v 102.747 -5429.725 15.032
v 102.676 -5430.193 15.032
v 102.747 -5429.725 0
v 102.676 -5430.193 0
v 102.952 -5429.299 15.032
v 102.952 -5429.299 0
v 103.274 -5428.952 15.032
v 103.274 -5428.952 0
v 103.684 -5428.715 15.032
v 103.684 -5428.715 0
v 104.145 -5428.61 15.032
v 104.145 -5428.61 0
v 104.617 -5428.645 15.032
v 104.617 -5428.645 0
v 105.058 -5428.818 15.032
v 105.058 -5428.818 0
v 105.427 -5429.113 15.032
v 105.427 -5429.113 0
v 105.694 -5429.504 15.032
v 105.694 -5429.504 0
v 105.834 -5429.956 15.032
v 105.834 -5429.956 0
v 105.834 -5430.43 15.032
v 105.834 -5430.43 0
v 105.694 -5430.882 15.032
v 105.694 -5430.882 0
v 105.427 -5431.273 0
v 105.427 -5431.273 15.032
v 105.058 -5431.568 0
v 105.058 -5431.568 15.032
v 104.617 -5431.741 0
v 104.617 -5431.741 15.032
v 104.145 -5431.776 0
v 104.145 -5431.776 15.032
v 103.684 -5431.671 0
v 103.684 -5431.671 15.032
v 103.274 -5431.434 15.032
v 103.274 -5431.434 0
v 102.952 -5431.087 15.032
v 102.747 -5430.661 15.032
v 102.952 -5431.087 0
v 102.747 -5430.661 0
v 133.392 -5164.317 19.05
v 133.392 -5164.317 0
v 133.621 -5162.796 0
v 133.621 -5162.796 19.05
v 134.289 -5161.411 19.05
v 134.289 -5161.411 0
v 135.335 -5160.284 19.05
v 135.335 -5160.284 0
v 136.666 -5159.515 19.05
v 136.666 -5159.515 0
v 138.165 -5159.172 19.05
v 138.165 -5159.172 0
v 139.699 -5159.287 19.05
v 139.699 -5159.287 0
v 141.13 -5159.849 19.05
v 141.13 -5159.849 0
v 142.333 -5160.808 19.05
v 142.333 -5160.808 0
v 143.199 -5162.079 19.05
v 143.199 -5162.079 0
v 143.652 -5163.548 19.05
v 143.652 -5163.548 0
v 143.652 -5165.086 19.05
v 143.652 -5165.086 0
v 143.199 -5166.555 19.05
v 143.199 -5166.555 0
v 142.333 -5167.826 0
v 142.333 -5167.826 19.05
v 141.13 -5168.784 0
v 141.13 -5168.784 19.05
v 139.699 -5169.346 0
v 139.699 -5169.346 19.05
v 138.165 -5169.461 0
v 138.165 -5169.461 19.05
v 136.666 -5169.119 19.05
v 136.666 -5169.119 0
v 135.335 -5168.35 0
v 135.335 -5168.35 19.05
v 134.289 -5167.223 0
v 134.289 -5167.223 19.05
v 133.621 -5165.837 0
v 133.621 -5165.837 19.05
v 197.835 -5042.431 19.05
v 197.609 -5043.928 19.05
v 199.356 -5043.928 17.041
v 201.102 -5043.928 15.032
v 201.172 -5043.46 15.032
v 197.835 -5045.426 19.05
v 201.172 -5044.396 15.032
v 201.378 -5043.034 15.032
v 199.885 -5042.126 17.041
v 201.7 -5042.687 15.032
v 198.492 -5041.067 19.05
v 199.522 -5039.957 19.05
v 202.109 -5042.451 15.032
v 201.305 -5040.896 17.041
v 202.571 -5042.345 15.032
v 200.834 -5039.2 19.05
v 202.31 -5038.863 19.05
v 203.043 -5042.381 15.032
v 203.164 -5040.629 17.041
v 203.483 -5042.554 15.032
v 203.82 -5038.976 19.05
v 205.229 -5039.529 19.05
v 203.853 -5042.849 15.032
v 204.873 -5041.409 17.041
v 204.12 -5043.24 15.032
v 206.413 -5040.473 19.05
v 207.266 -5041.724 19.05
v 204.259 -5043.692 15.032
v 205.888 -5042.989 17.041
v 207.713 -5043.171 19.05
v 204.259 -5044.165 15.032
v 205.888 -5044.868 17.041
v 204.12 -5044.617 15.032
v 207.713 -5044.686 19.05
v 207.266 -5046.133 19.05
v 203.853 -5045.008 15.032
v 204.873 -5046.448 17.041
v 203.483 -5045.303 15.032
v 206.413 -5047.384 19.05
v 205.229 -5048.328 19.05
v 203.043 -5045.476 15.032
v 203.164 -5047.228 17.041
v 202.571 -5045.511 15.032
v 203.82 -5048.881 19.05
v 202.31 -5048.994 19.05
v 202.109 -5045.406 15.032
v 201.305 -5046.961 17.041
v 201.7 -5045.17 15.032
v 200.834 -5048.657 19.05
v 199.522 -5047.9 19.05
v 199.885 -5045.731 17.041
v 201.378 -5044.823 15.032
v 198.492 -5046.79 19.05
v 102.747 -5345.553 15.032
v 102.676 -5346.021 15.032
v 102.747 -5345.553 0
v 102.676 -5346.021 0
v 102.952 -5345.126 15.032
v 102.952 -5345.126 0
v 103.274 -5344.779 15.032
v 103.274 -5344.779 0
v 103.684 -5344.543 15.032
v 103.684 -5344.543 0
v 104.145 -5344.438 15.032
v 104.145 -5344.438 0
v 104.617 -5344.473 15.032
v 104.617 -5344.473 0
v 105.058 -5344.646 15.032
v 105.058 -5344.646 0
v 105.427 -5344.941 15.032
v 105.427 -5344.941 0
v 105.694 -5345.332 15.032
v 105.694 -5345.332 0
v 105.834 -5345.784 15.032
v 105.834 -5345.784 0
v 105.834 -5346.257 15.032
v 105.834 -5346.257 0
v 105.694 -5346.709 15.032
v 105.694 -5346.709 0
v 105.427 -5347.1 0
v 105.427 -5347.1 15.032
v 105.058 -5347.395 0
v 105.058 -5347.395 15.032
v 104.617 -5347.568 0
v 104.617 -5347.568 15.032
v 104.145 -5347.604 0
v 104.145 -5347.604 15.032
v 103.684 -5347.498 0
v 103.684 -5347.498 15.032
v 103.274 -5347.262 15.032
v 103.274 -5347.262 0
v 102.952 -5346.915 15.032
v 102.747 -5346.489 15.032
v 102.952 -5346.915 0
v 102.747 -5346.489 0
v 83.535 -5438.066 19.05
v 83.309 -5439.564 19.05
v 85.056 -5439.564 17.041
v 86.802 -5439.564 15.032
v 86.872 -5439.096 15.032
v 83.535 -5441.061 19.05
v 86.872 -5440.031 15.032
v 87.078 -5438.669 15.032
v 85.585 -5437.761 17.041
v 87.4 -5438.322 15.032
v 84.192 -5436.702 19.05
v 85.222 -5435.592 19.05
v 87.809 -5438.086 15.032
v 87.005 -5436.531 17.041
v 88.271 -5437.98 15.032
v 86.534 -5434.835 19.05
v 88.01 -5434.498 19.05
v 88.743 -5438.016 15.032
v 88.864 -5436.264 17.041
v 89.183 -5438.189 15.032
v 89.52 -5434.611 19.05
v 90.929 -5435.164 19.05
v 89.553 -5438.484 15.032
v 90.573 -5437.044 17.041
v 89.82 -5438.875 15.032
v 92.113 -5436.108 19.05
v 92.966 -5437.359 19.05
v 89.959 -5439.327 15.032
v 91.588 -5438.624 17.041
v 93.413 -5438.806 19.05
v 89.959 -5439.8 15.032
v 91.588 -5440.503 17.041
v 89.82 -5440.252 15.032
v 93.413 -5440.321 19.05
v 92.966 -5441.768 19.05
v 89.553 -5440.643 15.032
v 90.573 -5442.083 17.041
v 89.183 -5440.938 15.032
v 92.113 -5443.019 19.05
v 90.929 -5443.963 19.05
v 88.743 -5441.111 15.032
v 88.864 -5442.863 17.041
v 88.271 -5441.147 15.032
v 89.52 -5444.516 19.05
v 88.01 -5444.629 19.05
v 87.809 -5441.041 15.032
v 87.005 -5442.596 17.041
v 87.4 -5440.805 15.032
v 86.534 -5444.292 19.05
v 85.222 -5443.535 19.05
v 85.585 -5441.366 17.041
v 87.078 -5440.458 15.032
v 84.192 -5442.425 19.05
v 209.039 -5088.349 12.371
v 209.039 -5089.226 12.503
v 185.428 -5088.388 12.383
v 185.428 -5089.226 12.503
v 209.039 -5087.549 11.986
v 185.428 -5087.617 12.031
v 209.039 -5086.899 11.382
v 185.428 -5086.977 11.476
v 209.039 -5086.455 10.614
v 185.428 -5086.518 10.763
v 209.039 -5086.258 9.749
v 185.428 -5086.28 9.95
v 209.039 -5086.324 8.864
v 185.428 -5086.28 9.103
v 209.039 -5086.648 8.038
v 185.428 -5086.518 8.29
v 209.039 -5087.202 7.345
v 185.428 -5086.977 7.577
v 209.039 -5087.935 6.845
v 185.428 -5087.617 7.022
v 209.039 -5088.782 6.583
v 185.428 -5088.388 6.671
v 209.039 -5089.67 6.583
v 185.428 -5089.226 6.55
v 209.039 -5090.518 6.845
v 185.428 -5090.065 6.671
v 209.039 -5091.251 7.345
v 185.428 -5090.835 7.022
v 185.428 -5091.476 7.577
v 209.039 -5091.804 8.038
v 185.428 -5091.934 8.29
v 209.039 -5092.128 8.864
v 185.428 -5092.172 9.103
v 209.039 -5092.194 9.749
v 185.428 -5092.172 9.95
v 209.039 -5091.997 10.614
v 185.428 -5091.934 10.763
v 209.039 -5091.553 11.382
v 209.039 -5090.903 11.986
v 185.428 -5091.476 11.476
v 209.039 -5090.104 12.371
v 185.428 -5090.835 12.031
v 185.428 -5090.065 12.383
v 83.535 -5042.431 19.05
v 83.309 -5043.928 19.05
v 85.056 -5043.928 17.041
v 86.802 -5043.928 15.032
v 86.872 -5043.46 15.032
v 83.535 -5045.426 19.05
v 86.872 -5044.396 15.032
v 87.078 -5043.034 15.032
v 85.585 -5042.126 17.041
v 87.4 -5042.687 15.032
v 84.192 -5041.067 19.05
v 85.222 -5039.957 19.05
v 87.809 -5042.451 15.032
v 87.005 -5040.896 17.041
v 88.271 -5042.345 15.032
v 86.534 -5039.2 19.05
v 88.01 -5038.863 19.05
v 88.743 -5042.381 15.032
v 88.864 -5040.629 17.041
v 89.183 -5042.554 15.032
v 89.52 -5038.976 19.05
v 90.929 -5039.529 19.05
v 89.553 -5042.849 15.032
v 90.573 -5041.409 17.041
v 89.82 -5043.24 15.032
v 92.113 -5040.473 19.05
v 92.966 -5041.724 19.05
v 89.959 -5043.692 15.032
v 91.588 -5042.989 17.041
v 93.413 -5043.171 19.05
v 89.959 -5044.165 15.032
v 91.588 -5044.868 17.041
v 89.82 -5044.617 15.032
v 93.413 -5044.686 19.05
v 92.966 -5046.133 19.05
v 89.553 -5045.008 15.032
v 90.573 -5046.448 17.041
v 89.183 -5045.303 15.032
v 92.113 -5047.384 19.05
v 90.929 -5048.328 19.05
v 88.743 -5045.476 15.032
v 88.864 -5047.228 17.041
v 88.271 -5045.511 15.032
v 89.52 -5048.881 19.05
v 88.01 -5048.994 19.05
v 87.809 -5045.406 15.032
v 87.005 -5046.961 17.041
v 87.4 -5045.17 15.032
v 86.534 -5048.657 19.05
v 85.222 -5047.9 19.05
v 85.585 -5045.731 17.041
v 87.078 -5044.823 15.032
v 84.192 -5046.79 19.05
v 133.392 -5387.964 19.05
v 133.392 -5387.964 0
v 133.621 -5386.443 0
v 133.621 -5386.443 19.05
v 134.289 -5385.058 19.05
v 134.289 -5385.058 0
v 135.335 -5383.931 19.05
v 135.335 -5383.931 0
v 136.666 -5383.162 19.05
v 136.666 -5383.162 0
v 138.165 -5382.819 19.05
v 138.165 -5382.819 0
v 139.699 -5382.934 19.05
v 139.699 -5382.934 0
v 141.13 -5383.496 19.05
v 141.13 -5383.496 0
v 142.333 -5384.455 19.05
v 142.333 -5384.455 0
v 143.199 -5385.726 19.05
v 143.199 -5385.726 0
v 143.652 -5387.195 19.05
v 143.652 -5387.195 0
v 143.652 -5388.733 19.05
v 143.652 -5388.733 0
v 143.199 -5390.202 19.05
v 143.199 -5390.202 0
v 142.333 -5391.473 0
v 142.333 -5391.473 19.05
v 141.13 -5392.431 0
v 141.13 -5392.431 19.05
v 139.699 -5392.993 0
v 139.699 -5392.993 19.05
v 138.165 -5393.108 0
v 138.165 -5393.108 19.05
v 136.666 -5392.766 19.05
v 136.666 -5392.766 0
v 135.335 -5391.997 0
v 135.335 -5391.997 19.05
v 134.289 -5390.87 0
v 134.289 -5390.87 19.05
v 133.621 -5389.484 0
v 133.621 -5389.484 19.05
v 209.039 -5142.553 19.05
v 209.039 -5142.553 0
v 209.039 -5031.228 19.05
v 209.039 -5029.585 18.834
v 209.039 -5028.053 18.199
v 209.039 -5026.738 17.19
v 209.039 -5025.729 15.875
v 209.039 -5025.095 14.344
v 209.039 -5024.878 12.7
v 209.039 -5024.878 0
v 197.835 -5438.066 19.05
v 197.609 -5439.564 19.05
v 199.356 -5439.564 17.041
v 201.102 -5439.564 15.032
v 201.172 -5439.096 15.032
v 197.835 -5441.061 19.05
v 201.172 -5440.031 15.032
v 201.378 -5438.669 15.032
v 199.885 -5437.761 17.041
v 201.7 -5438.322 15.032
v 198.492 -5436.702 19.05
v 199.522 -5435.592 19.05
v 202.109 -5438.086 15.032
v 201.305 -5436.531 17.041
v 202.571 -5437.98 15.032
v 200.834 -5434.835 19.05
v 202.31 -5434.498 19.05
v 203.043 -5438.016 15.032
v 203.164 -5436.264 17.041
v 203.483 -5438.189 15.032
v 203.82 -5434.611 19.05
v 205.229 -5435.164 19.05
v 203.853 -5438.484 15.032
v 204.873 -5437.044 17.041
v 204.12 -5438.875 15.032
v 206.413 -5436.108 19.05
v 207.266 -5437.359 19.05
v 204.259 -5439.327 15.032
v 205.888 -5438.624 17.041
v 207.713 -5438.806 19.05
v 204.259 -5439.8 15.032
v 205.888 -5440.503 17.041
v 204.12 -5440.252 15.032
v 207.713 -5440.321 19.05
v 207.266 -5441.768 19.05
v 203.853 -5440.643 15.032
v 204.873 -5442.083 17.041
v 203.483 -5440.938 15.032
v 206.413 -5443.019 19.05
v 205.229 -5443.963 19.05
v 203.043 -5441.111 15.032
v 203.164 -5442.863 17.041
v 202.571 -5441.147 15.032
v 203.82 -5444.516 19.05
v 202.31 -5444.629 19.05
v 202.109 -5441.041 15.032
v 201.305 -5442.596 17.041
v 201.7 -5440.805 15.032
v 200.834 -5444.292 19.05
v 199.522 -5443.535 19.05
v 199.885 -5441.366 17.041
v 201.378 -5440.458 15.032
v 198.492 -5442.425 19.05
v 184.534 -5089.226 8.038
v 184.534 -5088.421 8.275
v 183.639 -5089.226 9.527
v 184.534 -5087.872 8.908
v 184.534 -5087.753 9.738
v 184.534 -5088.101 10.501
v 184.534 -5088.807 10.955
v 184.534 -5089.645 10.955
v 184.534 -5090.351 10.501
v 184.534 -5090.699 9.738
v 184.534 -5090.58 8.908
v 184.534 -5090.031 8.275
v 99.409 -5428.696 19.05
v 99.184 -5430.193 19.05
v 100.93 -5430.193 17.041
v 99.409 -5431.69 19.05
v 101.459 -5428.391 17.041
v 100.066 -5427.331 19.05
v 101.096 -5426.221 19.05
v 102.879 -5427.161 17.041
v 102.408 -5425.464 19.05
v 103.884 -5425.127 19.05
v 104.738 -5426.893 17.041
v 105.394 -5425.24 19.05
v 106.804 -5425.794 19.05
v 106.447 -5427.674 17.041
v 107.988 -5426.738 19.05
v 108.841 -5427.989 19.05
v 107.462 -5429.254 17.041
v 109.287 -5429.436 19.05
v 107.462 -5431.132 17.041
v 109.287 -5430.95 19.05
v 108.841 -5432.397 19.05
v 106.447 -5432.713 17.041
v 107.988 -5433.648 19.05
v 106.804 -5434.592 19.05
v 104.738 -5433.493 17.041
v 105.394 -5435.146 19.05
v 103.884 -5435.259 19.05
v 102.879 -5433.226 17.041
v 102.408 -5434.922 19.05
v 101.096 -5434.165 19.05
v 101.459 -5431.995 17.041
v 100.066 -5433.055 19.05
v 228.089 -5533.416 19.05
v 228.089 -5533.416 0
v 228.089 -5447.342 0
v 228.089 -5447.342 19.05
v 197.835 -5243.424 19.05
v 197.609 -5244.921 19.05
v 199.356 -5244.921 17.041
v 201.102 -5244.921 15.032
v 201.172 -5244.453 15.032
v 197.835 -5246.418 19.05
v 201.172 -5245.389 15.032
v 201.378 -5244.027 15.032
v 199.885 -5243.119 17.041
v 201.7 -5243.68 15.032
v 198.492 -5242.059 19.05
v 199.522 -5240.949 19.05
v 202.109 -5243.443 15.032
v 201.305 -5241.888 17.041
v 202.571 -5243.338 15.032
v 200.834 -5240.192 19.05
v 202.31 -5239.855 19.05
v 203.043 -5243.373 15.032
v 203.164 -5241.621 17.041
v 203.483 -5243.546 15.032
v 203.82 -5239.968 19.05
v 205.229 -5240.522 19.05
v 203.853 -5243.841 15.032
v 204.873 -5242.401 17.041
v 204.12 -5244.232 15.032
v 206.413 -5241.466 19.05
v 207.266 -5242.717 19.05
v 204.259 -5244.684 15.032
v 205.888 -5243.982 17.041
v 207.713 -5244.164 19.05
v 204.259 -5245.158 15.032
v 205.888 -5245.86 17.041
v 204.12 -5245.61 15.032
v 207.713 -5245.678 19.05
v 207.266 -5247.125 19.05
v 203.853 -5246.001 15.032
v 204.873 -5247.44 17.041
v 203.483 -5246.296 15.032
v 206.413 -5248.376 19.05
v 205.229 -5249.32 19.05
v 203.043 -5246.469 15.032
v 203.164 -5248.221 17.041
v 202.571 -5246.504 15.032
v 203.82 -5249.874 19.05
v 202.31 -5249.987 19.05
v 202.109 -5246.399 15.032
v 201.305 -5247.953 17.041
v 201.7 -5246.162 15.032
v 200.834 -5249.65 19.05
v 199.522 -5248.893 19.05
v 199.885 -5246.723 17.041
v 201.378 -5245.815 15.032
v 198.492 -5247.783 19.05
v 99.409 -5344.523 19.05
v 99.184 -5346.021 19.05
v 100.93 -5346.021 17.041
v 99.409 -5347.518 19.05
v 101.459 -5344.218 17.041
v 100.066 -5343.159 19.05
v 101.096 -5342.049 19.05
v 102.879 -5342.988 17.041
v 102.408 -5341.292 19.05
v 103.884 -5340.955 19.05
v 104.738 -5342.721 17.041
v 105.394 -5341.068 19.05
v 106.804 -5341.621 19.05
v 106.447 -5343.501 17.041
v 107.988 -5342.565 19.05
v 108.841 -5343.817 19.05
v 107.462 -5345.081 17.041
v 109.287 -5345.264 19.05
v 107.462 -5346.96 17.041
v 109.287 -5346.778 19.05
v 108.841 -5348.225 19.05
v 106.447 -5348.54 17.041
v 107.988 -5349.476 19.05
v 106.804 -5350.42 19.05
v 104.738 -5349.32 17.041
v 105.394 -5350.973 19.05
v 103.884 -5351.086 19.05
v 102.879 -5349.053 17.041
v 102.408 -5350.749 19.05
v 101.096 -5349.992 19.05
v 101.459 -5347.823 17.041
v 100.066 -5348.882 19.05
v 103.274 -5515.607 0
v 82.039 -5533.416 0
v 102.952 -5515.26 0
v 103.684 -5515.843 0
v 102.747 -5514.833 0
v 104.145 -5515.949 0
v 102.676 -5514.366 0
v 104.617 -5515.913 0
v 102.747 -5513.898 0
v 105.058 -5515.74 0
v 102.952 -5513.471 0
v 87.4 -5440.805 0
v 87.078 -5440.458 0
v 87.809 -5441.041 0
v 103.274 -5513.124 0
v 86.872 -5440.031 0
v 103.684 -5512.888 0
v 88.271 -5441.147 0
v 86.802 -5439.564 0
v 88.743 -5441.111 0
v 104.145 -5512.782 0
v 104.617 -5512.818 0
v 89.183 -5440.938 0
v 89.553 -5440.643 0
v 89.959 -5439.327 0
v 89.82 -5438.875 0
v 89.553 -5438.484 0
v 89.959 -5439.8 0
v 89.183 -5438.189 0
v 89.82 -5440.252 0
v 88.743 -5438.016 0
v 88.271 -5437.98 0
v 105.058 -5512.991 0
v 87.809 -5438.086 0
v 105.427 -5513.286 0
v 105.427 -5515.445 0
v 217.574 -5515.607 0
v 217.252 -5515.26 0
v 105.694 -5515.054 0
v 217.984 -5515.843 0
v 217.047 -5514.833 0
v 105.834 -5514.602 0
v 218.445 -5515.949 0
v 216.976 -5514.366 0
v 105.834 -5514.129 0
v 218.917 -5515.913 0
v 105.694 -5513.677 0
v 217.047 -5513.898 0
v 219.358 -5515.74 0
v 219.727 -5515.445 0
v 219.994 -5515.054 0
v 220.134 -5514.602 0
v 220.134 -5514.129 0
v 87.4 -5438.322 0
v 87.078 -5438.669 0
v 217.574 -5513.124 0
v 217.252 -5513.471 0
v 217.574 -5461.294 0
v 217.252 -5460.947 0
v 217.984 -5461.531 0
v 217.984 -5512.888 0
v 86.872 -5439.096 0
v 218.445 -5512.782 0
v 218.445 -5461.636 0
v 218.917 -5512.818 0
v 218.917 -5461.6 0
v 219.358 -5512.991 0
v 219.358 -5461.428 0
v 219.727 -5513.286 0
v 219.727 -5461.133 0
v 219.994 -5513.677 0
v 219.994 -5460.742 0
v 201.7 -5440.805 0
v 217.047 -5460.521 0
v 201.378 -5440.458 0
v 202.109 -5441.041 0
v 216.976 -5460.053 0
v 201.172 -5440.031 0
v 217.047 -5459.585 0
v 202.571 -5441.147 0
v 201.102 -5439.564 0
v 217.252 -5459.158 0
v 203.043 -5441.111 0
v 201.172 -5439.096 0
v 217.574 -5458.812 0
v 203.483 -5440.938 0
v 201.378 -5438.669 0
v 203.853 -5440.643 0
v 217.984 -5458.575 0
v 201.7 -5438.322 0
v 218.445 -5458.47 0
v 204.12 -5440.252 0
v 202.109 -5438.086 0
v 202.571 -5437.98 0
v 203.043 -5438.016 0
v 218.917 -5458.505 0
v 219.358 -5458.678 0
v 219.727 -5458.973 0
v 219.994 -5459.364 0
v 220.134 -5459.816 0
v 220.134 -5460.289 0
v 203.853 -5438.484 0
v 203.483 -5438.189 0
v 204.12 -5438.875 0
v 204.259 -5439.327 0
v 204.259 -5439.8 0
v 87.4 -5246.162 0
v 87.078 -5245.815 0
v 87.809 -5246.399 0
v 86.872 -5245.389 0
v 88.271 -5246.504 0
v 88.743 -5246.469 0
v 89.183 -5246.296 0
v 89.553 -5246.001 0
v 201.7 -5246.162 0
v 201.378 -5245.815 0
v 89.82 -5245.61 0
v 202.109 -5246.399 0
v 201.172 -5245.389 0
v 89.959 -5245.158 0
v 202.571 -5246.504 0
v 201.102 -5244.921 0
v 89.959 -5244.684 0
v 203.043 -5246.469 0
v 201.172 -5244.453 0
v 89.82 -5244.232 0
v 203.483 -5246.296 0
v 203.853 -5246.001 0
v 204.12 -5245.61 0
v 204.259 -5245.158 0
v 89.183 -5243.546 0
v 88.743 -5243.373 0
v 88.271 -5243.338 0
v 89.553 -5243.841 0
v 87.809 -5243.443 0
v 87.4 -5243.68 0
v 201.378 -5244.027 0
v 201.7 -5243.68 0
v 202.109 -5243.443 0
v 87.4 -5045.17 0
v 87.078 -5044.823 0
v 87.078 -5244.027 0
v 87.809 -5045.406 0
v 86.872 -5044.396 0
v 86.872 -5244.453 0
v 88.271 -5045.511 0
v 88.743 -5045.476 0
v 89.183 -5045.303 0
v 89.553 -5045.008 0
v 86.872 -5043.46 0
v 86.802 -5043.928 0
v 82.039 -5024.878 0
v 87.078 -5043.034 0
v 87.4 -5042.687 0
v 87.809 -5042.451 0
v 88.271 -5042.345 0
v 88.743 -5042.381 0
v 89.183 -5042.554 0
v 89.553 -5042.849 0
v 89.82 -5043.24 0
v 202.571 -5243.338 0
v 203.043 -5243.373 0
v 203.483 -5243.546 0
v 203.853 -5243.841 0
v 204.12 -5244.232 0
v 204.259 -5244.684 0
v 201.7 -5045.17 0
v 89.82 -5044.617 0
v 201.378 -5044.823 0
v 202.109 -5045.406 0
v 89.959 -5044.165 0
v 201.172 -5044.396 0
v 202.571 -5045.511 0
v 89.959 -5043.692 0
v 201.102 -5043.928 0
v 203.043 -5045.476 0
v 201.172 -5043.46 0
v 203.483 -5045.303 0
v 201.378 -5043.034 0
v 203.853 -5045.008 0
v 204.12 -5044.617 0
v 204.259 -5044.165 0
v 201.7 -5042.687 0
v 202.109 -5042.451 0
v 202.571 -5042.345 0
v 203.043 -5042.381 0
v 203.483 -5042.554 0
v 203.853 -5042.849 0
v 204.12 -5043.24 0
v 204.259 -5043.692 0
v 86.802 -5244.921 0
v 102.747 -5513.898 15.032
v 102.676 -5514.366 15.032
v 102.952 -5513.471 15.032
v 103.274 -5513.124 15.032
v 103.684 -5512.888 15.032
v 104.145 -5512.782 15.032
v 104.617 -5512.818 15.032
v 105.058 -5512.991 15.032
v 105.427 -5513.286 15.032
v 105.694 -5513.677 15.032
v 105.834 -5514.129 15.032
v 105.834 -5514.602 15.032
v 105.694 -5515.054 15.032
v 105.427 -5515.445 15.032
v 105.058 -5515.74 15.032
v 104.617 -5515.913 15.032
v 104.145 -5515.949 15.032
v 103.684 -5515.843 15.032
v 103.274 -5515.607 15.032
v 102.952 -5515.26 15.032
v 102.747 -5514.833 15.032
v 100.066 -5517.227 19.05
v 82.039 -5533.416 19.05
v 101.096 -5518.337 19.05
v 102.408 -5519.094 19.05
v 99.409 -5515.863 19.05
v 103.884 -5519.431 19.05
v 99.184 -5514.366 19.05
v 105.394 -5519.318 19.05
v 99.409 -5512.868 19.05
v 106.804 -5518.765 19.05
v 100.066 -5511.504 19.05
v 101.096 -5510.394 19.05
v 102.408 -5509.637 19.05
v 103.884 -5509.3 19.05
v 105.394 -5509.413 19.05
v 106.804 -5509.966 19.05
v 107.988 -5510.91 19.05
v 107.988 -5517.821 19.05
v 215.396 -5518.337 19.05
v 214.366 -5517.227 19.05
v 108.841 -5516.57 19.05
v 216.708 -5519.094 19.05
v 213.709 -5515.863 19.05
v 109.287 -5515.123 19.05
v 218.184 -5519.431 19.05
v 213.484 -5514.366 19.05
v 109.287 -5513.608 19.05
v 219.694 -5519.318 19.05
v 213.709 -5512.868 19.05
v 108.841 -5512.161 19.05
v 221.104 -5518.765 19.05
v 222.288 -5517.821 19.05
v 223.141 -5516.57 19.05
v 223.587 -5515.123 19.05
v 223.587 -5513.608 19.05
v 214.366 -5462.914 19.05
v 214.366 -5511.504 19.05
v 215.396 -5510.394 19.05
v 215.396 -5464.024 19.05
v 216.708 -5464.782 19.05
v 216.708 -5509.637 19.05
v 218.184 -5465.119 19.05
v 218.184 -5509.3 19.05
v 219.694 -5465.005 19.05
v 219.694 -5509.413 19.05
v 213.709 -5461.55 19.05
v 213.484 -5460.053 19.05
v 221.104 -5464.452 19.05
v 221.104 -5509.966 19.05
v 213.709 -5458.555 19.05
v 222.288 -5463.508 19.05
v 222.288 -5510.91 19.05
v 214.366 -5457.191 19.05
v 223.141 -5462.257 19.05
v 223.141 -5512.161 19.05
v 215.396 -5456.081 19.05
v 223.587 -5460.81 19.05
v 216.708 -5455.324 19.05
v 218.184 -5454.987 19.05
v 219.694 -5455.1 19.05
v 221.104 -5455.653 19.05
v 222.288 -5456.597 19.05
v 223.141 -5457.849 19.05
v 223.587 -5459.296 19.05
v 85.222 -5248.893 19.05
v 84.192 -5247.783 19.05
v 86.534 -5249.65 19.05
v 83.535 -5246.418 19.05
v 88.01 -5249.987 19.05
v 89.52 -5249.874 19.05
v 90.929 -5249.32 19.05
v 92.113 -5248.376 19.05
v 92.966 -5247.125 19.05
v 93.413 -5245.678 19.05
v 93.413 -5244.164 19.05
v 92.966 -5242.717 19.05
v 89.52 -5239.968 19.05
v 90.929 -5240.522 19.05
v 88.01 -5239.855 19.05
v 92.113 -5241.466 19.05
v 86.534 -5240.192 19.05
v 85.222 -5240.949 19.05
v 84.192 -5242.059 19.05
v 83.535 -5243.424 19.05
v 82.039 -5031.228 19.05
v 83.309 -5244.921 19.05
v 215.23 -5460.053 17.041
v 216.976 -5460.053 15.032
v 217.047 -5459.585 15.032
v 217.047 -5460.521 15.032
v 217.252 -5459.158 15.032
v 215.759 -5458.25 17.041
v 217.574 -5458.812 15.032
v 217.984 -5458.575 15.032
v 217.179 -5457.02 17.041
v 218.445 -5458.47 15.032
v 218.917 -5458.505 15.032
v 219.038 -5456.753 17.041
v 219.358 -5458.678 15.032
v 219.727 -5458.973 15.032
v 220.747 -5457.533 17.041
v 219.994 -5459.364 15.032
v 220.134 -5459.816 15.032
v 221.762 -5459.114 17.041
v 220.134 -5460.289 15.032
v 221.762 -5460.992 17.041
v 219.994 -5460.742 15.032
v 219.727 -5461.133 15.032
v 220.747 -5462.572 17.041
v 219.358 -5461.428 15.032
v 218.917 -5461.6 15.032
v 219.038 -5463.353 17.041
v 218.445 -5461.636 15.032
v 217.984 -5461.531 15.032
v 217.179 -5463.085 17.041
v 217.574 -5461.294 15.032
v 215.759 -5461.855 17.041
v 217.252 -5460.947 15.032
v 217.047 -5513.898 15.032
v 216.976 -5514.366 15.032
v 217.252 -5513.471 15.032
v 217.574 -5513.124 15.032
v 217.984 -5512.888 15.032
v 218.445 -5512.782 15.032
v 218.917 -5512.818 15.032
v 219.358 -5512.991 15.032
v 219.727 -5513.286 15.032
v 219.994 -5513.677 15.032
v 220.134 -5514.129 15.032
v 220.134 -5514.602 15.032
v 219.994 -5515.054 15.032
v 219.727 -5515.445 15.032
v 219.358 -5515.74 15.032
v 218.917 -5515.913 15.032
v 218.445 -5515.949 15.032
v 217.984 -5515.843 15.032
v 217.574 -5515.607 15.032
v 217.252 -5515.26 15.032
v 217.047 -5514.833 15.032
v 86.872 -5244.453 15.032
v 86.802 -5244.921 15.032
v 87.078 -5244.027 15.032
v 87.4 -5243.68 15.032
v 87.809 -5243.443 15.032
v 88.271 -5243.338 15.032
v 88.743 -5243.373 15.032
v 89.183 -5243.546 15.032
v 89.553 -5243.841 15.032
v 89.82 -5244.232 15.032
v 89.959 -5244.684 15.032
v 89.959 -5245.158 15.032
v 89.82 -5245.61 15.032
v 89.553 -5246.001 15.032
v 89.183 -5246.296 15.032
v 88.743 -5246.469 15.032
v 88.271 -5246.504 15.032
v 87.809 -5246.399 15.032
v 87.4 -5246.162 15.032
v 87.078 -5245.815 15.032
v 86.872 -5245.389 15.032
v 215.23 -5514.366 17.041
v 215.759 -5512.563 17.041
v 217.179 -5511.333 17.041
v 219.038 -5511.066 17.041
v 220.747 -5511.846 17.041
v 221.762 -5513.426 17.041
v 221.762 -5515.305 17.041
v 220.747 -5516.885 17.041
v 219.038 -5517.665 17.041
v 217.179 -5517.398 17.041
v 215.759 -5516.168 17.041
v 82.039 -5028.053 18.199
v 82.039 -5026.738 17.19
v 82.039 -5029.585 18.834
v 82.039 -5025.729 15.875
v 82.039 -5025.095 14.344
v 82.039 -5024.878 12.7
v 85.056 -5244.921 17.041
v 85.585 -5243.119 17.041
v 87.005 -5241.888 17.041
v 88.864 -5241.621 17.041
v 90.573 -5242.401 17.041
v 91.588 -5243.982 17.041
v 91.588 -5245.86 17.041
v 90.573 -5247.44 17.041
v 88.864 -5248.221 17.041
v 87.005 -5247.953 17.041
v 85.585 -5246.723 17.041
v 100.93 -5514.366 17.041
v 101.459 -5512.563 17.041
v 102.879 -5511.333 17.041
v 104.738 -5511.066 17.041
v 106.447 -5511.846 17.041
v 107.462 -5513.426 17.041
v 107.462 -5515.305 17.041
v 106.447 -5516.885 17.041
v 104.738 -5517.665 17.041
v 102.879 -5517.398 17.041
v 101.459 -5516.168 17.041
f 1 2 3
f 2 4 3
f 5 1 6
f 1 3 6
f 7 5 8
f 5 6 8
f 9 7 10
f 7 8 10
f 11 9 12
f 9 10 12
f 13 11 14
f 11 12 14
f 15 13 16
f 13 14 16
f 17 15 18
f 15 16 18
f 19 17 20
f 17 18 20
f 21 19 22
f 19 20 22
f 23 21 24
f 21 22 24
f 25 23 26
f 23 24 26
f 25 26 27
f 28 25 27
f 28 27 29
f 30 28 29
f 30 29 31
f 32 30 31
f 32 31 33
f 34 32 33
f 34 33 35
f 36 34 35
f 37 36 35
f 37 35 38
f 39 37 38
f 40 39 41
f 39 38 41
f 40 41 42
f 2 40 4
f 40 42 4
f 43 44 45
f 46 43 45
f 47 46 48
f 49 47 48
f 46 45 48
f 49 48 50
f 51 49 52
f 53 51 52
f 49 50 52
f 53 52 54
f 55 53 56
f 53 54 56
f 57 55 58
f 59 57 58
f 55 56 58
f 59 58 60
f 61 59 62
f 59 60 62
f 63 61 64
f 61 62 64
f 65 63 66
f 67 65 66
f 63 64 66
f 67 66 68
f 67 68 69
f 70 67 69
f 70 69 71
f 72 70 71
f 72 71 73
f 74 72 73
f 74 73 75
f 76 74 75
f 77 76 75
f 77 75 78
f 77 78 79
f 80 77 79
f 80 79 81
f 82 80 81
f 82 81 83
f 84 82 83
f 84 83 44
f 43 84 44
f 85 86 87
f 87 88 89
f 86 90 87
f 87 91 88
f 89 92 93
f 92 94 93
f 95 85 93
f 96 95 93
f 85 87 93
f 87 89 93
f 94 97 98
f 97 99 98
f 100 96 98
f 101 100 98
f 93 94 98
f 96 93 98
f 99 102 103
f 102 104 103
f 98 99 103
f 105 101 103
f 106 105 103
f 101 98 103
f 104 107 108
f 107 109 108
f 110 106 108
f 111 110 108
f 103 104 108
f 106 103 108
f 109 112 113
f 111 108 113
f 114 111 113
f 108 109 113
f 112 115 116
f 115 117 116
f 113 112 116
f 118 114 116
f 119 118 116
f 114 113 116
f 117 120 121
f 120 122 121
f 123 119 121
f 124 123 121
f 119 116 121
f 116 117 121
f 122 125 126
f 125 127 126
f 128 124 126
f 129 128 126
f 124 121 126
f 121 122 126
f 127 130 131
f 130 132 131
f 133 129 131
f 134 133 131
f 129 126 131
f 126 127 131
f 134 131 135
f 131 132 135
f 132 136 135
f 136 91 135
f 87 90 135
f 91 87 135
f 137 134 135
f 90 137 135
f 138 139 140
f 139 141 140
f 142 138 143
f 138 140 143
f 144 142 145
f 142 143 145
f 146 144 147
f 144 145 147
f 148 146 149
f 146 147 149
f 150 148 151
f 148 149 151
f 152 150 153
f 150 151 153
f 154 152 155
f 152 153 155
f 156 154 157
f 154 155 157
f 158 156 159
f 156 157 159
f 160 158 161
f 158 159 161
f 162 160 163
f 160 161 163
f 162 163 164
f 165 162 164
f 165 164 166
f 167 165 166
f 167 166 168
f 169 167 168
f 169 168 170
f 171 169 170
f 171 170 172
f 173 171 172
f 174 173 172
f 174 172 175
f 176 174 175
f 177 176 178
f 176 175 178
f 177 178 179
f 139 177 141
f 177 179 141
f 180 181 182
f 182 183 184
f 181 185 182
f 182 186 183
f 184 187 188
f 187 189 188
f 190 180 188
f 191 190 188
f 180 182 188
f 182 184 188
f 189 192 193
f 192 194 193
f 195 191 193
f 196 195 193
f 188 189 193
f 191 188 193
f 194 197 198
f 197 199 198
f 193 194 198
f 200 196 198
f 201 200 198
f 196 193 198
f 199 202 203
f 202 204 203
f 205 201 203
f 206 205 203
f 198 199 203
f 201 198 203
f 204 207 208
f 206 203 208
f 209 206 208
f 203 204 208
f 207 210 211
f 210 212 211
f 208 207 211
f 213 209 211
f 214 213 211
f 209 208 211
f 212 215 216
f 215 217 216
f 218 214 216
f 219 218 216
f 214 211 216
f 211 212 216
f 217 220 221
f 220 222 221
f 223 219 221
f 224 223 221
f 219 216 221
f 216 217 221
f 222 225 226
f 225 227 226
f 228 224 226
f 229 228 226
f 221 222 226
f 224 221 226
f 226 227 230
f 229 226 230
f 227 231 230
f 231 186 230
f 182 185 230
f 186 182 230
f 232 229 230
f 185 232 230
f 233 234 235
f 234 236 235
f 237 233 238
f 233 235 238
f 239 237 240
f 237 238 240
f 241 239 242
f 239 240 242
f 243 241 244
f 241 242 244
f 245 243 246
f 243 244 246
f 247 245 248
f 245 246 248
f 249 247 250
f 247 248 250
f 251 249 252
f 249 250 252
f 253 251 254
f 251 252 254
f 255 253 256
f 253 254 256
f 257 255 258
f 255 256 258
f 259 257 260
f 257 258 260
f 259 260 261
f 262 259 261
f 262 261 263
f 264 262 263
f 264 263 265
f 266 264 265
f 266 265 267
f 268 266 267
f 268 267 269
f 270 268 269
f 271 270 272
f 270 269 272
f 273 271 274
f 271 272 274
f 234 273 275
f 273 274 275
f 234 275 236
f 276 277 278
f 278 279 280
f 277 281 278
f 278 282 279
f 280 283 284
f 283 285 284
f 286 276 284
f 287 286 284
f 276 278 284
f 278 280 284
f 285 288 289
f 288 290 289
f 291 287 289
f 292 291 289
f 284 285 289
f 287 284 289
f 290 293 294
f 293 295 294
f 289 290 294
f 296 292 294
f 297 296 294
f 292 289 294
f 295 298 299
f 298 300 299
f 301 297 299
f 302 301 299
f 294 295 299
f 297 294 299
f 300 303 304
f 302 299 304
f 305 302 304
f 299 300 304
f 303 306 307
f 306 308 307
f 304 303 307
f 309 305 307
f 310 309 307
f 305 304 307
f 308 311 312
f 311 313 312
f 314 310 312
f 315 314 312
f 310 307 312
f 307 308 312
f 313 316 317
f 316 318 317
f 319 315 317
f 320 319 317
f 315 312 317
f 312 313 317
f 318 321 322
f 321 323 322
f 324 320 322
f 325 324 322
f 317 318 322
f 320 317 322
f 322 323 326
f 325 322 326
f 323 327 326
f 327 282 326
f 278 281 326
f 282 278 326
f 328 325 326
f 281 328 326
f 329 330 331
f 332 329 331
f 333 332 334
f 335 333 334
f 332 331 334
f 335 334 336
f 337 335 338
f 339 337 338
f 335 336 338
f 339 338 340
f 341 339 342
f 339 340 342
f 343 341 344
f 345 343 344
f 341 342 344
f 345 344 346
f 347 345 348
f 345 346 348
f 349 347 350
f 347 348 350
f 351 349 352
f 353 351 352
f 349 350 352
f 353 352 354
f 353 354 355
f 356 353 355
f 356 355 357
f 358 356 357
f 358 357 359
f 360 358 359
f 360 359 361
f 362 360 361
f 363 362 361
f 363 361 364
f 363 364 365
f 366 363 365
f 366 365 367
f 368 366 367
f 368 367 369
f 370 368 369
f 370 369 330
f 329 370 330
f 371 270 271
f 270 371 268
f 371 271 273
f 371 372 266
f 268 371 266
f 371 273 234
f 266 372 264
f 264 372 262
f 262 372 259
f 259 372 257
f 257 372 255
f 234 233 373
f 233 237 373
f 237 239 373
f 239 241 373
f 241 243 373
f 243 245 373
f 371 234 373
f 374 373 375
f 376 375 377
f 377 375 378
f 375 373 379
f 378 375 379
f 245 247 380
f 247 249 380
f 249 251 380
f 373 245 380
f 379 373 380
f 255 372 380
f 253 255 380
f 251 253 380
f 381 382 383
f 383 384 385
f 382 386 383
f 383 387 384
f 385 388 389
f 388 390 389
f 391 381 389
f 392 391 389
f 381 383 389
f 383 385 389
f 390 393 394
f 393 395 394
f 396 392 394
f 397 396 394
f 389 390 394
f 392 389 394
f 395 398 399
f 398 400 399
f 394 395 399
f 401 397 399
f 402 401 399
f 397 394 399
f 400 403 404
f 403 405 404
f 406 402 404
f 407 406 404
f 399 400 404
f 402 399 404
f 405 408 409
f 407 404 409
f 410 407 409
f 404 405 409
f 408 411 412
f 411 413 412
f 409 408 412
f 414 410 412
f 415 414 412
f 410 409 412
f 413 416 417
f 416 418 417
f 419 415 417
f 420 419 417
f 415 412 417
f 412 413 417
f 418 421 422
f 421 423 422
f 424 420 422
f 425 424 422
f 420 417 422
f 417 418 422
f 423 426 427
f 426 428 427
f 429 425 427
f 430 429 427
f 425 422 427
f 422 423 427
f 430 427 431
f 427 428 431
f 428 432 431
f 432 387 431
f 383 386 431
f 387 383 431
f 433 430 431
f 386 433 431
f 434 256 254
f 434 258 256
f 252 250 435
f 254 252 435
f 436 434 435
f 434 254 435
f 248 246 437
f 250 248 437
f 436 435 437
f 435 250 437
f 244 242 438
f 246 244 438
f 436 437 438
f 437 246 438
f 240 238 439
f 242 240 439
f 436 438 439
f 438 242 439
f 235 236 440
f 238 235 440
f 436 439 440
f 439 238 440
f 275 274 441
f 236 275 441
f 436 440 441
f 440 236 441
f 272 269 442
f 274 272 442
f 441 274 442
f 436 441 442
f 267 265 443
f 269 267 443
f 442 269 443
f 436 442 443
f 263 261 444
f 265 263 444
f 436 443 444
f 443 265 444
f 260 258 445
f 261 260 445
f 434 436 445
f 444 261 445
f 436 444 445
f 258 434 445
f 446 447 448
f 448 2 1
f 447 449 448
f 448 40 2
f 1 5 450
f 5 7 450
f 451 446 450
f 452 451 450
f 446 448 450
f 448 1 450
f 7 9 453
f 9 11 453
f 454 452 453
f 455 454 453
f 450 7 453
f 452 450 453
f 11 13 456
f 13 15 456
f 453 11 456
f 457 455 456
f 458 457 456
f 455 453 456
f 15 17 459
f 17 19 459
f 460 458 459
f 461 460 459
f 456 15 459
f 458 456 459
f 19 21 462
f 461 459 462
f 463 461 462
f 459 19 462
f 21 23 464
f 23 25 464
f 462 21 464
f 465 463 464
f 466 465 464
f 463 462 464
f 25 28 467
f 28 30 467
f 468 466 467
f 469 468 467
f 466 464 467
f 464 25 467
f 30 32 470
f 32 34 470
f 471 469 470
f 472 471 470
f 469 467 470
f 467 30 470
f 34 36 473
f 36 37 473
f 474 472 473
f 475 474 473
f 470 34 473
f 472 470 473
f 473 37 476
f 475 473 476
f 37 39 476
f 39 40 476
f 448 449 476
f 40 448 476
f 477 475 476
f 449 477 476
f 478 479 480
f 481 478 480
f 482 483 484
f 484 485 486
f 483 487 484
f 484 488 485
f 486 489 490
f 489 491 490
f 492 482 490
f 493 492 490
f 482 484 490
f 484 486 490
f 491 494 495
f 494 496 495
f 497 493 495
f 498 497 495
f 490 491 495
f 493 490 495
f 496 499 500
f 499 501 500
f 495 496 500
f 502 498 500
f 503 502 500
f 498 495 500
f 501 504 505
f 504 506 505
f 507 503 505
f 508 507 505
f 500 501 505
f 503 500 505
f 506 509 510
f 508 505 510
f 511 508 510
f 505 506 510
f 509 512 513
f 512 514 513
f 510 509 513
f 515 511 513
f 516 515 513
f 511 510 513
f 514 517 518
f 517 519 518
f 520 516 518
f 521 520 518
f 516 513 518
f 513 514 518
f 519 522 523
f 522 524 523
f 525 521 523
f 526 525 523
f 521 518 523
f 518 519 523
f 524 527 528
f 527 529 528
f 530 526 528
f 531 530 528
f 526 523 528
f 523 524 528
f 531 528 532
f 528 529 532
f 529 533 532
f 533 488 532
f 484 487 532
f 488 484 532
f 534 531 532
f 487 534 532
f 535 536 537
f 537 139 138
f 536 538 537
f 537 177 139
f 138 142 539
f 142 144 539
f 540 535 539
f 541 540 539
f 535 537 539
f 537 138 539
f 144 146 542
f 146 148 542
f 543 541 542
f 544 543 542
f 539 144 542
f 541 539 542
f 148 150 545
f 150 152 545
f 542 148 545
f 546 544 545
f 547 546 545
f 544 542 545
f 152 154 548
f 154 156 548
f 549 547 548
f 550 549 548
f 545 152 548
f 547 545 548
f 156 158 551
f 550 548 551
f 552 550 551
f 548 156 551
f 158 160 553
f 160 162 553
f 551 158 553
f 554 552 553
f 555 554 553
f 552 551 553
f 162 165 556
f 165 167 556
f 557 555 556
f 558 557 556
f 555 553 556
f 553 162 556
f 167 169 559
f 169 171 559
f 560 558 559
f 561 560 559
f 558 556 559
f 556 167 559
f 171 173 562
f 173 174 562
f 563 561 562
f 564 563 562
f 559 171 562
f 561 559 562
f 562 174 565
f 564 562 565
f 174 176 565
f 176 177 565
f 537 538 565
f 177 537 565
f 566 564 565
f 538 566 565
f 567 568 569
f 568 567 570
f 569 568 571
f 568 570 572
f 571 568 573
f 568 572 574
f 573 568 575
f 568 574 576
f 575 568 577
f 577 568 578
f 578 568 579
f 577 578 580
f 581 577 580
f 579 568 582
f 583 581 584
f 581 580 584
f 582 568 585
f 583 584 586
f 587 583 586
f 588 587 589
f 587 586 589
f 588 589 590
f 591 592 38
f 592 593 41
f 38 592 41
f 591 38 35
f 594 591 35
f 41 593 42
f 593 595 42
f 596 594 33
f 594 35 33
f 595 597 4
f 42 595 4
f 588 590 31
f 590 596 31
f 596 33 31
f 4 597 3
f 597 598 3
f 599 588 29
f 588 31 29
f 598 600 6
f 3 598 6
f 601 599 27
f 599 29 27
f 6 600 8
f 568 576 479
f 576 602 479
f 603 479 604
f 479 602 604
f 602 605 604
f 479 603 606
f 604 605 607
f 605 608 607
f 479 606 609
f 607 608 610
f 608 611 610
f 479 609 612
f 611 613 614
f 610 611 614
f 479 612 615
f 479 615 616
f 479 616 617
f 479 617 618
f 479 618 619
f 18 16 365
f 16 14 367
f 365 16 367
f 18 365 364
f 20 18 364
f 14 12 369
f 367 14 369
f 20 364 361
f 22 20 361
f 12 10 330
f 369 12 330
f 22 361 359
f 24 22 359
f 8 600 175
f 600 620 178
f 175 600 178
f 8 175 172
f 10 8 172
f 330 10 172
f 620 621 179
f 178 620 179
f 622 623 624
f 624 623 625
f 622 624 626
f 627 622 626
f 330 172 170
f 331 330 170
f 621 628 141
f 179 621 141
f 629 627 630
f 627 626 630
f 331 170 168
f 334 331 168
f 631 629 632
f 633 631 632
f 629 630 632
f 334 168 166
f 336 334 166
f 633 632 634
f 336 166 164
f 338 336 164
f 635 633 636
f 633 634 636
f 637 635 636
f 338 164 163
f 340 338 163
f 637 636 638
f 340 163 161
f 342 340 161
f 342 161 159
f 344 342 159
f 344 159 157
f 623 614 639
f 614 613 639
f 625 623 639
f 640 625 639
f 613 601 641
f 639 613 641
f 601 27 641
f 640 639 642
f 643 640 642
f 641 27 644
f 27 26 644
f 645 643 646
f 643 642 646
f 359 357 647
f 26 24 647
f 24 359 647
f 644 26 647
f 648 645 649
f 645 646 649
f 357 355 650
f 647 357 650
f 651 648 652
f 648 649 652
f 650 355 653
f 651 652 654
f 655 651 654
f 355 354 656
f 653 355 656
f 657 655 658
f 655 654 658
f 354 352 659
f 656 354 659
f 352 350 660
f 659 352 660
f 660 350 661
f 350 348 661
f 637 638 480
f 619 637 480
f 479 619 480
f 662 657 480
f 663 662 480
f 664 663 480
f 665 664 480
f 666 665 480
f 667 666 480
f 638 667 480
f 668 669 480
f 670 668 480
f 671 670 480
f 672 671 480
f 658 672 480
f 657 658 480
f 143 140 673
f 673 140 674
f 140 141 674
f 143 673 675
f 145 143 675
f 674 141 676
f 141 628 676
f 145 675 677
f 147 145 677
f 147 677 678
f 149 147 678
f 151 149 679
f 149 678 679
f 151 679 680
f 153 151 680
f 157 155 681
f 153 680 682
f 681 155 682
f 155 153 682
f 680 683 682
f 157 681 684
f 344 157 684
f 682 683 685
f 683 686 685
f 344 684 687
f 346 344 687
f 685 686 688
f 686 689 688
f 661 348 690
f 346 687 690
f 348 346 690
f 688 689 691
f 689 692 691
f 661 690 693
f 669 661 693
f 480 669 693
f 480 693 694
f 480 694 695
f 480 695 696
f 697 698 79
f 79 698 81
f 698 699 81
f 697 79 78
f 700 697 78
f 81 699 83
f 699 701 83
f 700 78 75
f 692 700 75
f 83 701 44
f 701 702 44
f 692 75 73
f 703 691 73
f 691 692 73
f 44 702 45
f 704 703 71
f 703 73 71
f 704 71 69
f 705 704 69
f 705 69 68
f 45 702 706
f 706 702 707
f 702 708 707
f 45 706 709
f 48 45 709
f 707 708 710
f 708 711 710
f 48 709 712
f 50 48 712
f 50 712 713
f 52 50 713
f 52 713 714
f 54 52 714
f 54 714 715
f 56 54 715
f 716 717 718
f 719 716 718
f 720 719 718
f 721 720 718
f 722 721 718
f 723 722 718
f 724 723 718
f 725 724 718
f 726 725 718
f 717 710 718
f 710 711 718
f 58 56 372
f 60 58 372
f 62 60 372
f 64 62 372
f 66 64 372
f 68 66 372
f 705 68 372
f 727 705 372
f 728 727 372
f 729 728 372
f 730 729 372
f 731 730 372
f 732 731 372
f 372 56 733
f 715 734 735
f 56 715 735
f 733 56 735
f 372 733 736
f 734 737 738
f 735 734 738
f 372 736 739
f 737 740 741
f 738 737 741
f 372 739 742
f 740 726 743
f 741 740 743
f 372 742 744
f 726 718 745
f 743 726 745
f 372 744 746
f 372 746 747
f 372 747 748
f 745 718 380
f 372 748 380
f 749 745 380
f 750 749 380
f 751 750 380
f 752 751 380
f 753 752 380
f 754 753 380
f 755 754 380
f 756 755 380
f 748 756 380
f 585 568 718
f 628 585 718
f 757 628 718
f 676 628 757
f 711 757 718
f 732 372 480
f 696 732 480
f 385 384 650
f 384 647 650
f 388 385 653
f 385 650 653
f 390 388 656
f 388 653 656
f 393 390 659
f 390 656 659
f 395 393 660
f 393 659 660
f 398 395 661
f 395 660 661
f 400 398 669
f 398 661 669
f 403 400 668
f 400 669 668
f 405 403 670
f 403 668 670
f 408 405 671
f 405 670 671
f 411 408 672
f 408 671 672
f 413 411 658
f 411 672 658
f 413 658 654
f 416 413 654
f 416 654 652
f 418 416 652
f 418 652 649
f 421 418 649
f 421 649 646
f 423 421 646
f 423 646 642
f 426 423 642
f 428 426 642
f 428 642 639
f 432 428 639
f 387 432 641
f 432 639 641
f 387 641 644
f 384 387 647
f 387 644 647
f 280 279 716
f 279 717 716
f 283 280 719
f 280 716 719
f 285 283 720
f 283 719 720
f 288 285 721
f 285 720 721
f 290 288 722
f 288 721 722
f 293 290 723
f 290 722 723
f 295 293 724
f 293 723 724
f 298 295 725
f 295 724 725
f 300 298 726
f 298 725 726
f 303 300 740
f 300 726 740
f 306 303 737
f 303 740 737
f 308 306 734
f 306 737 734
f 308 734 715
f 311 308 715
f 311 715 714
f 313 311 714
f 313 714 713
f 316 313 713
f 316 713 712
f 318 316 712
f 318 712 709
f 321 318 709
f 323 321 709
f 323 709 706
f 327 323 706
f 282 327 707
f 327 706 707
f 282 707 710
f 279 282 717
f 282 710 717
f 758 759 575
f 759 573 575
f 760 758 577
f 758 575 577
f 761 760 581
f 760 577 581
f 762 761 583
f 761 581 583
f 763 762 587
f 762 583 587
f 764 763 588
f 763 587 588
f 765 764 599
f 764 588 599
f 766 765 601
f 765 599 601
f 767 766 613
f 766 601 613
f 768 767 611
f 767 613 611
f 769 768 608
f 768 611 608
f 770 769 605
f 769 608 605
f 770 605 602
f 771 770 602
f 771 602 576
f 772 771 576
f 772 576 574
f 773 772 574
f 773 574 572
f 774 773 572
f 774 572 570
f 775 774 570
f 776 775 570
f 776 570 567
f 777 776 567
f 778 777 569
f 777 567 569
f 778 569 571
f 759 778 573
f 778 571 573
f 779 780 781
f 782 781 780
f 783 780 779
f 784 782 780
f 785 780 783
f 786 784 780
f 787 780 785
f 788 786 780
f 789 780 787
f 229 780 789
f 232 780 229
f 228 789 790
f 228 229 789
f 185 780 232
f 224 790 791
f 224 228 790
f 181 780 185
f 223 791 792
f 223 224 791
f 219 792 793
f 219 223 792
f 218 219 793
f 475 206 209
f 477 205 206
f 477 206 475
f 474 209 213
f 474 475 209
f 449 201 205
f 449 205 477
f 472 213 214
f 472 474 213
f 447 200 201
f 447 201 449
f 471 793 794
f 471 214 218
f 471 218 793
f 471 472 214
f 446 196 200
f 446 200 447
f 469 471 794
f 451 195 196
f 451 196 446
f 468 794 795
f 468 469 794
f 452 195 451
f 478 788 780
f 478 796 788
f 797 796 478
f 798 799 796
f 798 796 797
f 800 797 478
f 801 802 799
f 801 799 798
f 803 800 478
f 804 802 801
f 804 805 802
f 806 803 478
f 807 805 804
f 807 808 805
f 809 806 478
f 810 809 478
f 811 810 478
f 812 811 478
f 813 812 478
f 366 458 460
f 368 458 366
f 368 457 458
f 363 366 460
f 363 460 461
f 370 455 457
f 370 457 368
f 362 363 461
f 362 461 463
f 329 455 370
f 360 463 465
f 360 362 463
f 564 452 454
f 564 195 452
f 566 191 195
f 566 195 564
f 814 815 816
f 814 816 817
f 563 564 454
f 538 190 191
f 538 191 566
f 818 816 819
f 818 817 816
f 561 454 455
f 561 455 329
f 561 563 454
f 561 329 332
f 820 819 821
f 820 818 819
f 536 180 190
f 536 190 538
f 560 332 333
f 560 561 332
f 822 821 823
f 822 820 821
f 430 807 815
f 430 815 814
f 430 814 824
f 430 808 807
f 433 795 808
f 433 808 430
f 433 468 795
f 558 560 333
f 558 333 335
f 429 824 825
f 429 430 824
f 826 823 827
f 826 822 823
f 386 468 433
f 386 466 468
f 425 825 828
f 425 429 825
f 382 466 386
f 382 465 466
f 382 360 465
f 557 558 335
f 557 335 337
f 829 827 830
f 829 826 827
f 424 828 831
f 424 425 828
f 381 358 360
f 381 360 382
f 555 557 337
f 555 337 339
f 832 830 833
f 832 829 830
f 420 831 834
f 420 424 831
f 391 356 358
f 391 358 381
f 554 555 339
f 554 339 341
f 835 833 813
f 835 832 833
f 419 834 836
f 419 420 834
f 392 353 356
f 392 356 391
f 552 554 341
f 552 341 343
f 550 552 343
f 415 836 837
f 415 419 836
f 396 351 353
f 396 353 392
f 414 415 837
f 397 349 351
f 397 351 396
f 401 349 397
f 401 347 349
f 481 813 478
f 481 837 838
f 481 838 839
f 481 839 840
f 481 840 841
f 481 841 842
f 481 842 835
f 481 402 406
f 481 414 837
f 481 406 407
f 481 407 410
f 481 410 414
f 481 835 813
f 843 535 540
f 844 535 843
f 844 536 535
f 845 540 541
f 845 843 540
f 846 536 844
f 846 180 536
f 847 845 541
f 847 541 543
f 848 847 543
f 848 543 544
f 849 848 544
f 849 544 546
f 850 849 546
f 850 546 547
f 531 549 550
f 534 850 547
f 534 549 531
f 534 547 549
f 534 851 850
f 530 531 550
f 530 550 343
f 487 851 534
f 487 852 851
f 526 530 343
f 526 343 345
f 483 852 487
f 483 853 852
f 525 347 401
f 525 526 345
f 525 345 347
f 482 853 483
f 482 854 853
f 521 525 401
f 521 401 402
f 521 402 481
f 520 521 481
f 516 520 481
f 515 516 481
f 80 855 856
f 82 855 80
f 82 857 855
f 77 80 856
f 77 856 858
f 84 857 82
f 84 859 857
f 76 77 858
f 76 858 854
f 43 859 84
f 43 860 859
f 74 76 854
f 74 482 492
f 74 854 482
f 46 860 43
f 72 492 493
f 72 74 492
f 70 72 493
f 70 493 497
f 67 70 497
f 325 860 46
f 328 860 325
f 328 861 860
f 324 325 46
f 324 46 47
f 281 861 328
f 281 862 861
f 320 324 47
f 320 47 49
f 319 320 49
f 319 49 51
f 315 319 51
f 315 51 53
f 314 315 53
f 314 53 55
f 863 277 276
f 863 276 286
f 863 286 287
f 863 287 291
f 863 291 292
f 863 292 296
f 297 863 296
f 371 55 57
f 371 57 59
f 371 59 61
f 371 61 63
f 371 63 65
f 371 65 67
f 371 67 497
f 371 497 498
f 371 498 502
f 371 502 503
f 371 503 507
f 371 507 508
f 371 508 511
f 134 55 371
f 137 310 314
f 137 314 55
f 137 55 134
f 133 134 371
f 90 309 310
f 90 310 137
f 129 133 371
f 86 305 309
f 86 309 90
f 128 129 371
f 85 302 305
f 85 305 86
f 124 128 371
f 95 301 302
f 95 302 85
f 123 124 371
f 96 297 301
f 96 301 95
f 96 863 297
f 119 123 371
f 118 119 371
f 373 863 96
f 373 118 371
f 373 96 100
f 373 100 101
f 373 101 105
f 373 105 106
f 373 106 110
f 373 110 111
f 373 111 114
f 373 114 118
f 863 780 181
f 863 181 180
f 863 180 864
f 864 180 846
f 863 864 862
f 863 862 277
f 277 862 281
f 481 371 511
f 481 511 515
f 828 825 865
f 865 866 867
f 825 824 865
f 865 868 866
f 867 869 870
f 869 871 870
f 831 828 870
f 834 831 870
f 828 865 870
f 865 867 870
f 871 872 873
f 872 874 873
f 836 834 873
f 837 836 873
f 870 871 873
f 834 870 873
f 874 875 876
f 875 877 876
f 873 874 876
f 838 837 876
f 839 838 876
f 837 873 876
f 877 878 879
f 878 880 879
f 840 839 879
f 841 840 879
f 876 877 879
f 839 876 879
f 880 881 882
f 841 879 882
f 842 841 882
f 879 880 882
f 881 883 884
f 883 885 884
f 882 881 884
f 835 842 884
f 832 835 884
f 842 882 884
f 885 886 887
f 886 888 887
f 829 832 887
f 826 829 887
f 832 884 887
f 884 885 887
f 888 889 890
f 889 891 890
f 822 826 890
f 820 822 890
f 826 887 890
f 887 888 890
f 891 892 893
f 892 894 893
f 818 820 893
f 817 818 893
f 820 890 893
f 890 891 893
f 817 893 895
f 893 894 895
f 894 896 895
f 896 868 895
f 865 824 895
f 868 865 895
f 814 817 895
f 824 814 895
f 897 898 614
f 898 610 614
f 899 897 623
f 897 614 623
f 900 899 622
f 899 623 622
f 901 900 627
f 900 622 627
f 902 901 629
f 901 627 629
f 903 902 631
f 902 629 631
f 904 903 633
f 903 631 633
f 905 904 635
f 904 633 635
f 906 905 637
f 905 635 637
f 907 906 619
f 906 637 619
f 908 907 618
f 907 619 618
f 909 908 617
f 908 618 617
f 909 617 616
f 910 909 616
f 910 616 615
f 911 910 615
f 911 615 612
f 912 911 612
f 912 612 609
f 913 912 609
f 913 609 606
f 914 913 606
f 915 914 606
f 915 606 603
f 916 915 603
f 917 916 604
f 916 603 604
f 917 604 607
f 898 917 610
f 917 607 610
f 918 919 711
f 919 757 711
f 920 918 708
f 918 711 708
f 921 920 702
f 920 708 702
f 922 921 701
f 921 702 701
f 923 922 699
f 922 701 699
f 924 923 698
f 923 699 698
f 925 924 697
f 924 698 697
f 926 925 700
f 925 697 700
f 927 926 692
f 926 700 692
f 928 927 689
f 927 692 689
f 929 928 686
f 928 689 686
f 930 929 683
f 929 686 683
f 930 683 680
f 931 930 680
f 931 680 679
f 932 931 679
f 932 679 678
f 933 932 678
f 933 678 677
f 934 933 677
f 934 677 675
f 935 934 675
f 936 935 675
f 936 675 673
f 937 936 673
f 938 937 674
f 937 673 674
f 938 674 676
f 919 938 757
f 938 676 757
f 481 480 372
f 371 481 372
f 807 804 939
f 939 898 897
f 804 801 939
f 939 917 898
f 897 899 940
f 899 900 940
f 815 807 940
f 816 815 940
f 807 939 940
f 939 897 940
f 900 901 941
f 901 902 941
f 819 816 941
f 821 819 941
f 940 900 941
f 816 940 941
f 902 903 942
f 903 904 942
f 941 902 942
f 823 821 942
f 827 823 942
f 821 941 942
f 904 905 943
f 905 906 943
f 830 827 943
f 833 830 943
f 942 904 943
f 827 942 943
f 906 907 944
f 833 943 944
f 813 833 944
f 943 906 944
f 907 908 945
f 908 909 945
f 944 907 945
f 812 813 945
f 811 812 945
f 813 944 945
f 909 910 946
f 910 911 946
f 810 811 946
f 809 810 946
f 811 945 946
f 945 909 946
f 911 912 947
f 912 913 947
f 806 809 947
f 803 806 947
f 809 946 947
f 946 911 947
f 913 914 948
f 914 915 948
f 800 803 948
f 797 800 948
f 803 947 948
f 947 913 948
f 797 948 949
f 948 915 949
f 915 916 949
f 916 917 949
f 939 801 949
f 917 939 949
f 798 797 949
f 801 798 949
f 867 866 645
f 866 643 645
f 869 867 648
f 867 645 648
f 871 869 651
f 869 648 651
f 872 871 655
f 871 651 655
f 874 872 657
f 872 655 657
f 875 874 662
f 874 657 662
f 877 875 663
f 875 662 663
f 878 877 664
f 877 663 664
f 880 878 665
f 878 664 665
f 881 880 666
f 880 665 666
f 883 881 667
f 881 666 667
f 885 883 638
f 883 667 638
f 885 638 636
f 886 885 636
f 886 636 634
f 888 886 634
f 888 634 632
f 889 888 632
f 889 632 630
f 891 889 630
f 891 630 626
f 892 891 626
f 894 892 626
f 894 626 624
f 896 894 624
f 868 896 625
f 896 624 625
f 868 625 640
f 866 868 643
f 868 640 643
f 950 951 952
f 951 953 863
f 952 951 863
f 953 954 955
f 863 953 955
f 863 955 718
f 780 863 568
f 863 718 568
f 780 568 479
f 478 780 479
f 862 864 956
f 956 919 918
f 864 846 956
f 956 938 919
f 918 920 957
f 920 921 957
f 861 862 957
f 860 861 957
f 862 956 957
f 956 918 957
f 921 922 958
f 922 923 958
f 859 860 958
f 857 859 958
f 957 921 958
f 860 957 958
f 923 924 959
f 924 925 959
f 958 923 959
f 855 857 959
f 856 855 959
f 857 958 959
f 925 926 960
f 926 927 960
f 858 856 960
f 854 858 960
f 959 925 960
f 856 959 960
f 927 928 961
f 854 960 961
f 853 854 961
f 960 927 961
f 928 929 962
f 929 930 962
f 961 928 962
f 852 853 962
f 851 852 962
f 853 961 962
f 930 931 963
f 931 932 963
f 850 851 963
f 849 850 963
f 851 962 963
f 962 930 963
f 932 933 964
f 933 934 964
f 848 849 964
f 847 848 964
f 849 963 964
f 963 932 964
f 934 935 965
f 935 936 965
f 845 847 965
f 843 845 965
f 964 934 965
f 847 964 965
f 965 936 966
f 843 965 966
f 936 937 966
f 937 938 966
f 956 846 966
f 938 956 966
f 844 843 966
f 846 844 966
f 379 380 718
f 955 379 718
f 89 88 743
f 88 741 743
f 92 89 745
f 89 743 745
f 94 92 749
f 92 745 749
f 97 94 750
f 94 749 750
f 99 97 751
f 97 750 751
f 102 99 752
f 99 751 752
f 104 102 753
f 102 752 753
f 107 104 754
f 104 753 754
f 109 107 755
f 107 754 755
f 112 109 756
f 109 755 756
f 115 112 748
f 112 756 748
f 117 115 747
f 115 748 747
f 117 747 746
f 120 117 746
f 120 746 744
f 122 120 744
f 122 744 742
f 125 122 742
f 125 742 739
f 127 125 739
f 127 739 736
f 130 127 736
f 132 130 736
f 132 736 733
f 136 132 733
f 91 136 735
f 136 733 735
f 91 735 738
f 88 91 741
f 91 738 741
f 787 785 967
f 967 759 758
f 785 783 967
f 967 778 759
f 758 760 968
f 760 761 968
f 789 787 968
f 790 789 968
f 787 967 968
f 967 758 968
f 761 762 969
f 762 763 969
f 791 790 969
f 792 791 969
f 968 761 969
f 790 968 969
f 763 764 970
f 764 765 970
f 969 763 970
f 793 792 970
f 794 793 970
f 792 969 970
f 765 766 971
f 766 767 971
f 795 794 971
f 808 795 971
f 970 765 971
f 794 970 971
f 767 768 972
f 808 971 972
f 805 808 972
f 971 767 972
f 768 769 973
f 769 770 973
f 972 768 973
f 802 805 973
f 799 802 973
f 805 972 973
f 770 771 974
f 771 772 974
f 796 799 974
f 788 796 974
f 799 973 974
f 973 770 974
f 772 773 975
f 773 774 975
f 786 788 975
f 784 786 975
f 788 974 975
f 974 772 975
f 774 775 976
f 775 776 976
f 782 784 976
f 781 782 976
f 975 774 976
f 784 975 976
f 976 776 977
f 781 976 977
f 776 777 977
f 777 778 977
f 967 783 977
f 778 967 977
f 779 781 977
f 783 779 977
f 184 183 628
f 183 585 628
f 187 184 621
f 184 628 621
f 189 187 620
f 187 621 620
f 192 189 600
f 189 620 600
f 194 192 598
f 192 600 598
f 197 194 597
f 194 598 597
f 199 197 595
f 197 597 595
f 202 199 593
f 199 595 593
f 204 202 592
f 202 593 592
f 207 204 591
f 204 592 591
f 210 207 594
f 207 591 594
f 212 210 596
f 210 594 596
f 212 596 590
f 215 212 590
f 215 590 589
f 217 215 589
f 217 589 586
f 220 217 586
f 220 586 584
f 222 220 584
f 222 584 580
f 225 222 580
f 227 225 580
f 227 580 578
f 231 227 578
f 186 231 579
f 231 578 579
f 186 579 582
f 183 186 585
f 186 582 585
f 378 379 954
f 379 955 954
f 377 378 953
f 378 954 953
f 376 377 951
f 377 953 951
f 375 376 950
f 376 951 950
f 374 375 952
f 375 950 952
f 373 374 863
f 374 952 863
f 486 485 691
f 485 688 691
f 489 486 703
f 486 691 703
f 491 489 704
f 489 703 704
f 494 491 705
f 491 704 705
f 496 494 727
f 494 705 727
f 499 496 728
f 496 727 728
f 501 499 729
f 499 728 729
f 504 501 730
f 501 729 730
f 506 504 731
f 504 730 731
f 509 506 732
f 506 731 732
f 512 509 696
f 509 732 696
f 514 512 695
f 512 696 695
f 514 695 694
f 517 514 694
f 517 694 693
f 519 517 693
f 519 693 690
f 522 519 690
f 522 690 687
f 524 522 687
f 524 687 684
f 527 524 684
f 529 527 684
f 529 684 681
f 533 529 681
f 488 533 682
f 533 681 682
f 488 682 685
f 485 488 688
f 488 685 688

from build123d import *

# Parameters (mm, degrees)
BOSS_EXTRUDE1_DEPTH                  = 19.05
F_3_8_CLEARANCE_HOLE1_D              = 10.31748
HOLE1_D                              = 3.175
HOLE1_DEPTH                          = 50.8
HOLE1_CSINK_D                        = 10.16
HOLE1_CSINK_ANGLE                    = 82
HOLE1_TIP                            = 0.953866233
F_15_64_0_23438_DIAMETER_HOLE1_D     = 5.953252
F_15_64_0_23438_DIAMETER_HOLE1_DEPTH = 23.611462659
F_15_64_0_23438_DIAMETER_HOLE1_TIP   = 1.788537341
FILLET1_R                            = 6.35


with BuildPart() as part:
    # Sketch1 → Boss-Extrude1 (new body)
    with BuildSketch(Plane.XY):
        Polygon((82.03946, -5024.878404071), (82.03946, -5533.415502988), (228.088766336, -5533.415502988), (228.088766336, -5447.34166837), (209.03946, -5142.552766987), (209.03946, -5024.878404071), align=None)
    extrude(amount=BOSS_EXTRUDE1_DEPTH)

    # 3/8 Clearance Hole1 (through all)
    with Locations(Plane.XY.offset(19.05)):
        with Locations((138.550999994, -5387.96381451), (138.550999994, -5164.31681451)):
            Hole(F_3_8_CLEARANCE_HOLE1_D / 2)

    # Hole1
    with Locations(Plane(origin=(0, -5562.870276207, 19.05), x_dir=(1, 0, 0), z_dir=(0, 0, 1))):
        with Locations((218.563766336, 102.817509219), (218.563766336, 48.504773219), (202.68946, 123.306744588), (202.68946, 317.949308361), (202.68946, 518.941872135), (88.38946, 518.941872135), (88.38946, 317.949308361), (88.38946, 123.306744588), (104.263766336, 216.849631358), (104.263766336, 132.677202288), (104.263766336, 48.504773219), (-104.263766336, 48.504773219), (-104.263766336, 132.677202288), (-104.263766336, 216.849631358), (-88.38946, 123.306744588), (-88.38946, 317.949308361), (-88.38946, 518.941872135), (-202.68946, 518.941872135), (-202.68946, 317.949308361), (-202.68946, 123.306744588), (-218.563766336, 48.504773219), (-218.563766336, 102.817509219)):
            CounterSinkHole(HOLE1_D / 2, HOLE1_CSINK_D / 2, depth=HOLE1_DEPTH, counter_sink_angle=HOLE1_CSINK_ANGLE)
            with Locations((0, 0, -(HOLE1_DEPTH + HOLE1_TIP / 2))):  # 118° drill point
                Cone(0, HOLE1_D / 2, HOLE1_TIP, mode=Mode.SUBTRACT)

    # 15/64 (0.23438) Diameter Hole1
    with Locations(Plane(origin=(209.03946, 0, 0), x_dir=(0, 0, -1), z_dir=(1, 0, 0))):
        with Locations((-9.526574029, -5089.226125561)):
            Hole(F_15_64_0_23438_DIAMETER_HOLE1_D / 2, depth=F_15_64_0_23438_DIAMETER_HOLE1_DEPTH)
            with Locations((0, 0, -(F_15_64_0_23438_DIAMETER_HOLE1_DEPTH + F_15_64_0_23438_DIAMETER_HOLE1_TIP / 2))):  # 118° drill point
                Cone(0, F_15_64_0_23438_DIAMETER_HOLE1_D / 2, F_15_64_0_23438_DIAMETER_HOLE1_TIP, mode=Mode.SUBTRACT)

    # Fillet1
    fillet1_edges = [part.edges().sort_by_distance(p)[0] for p in [
        (145.53946, -5024.878404071, 19.05),
    ]]
    fillet(fillet1_edges, radius=FILLET1_R)


solid = part.part
